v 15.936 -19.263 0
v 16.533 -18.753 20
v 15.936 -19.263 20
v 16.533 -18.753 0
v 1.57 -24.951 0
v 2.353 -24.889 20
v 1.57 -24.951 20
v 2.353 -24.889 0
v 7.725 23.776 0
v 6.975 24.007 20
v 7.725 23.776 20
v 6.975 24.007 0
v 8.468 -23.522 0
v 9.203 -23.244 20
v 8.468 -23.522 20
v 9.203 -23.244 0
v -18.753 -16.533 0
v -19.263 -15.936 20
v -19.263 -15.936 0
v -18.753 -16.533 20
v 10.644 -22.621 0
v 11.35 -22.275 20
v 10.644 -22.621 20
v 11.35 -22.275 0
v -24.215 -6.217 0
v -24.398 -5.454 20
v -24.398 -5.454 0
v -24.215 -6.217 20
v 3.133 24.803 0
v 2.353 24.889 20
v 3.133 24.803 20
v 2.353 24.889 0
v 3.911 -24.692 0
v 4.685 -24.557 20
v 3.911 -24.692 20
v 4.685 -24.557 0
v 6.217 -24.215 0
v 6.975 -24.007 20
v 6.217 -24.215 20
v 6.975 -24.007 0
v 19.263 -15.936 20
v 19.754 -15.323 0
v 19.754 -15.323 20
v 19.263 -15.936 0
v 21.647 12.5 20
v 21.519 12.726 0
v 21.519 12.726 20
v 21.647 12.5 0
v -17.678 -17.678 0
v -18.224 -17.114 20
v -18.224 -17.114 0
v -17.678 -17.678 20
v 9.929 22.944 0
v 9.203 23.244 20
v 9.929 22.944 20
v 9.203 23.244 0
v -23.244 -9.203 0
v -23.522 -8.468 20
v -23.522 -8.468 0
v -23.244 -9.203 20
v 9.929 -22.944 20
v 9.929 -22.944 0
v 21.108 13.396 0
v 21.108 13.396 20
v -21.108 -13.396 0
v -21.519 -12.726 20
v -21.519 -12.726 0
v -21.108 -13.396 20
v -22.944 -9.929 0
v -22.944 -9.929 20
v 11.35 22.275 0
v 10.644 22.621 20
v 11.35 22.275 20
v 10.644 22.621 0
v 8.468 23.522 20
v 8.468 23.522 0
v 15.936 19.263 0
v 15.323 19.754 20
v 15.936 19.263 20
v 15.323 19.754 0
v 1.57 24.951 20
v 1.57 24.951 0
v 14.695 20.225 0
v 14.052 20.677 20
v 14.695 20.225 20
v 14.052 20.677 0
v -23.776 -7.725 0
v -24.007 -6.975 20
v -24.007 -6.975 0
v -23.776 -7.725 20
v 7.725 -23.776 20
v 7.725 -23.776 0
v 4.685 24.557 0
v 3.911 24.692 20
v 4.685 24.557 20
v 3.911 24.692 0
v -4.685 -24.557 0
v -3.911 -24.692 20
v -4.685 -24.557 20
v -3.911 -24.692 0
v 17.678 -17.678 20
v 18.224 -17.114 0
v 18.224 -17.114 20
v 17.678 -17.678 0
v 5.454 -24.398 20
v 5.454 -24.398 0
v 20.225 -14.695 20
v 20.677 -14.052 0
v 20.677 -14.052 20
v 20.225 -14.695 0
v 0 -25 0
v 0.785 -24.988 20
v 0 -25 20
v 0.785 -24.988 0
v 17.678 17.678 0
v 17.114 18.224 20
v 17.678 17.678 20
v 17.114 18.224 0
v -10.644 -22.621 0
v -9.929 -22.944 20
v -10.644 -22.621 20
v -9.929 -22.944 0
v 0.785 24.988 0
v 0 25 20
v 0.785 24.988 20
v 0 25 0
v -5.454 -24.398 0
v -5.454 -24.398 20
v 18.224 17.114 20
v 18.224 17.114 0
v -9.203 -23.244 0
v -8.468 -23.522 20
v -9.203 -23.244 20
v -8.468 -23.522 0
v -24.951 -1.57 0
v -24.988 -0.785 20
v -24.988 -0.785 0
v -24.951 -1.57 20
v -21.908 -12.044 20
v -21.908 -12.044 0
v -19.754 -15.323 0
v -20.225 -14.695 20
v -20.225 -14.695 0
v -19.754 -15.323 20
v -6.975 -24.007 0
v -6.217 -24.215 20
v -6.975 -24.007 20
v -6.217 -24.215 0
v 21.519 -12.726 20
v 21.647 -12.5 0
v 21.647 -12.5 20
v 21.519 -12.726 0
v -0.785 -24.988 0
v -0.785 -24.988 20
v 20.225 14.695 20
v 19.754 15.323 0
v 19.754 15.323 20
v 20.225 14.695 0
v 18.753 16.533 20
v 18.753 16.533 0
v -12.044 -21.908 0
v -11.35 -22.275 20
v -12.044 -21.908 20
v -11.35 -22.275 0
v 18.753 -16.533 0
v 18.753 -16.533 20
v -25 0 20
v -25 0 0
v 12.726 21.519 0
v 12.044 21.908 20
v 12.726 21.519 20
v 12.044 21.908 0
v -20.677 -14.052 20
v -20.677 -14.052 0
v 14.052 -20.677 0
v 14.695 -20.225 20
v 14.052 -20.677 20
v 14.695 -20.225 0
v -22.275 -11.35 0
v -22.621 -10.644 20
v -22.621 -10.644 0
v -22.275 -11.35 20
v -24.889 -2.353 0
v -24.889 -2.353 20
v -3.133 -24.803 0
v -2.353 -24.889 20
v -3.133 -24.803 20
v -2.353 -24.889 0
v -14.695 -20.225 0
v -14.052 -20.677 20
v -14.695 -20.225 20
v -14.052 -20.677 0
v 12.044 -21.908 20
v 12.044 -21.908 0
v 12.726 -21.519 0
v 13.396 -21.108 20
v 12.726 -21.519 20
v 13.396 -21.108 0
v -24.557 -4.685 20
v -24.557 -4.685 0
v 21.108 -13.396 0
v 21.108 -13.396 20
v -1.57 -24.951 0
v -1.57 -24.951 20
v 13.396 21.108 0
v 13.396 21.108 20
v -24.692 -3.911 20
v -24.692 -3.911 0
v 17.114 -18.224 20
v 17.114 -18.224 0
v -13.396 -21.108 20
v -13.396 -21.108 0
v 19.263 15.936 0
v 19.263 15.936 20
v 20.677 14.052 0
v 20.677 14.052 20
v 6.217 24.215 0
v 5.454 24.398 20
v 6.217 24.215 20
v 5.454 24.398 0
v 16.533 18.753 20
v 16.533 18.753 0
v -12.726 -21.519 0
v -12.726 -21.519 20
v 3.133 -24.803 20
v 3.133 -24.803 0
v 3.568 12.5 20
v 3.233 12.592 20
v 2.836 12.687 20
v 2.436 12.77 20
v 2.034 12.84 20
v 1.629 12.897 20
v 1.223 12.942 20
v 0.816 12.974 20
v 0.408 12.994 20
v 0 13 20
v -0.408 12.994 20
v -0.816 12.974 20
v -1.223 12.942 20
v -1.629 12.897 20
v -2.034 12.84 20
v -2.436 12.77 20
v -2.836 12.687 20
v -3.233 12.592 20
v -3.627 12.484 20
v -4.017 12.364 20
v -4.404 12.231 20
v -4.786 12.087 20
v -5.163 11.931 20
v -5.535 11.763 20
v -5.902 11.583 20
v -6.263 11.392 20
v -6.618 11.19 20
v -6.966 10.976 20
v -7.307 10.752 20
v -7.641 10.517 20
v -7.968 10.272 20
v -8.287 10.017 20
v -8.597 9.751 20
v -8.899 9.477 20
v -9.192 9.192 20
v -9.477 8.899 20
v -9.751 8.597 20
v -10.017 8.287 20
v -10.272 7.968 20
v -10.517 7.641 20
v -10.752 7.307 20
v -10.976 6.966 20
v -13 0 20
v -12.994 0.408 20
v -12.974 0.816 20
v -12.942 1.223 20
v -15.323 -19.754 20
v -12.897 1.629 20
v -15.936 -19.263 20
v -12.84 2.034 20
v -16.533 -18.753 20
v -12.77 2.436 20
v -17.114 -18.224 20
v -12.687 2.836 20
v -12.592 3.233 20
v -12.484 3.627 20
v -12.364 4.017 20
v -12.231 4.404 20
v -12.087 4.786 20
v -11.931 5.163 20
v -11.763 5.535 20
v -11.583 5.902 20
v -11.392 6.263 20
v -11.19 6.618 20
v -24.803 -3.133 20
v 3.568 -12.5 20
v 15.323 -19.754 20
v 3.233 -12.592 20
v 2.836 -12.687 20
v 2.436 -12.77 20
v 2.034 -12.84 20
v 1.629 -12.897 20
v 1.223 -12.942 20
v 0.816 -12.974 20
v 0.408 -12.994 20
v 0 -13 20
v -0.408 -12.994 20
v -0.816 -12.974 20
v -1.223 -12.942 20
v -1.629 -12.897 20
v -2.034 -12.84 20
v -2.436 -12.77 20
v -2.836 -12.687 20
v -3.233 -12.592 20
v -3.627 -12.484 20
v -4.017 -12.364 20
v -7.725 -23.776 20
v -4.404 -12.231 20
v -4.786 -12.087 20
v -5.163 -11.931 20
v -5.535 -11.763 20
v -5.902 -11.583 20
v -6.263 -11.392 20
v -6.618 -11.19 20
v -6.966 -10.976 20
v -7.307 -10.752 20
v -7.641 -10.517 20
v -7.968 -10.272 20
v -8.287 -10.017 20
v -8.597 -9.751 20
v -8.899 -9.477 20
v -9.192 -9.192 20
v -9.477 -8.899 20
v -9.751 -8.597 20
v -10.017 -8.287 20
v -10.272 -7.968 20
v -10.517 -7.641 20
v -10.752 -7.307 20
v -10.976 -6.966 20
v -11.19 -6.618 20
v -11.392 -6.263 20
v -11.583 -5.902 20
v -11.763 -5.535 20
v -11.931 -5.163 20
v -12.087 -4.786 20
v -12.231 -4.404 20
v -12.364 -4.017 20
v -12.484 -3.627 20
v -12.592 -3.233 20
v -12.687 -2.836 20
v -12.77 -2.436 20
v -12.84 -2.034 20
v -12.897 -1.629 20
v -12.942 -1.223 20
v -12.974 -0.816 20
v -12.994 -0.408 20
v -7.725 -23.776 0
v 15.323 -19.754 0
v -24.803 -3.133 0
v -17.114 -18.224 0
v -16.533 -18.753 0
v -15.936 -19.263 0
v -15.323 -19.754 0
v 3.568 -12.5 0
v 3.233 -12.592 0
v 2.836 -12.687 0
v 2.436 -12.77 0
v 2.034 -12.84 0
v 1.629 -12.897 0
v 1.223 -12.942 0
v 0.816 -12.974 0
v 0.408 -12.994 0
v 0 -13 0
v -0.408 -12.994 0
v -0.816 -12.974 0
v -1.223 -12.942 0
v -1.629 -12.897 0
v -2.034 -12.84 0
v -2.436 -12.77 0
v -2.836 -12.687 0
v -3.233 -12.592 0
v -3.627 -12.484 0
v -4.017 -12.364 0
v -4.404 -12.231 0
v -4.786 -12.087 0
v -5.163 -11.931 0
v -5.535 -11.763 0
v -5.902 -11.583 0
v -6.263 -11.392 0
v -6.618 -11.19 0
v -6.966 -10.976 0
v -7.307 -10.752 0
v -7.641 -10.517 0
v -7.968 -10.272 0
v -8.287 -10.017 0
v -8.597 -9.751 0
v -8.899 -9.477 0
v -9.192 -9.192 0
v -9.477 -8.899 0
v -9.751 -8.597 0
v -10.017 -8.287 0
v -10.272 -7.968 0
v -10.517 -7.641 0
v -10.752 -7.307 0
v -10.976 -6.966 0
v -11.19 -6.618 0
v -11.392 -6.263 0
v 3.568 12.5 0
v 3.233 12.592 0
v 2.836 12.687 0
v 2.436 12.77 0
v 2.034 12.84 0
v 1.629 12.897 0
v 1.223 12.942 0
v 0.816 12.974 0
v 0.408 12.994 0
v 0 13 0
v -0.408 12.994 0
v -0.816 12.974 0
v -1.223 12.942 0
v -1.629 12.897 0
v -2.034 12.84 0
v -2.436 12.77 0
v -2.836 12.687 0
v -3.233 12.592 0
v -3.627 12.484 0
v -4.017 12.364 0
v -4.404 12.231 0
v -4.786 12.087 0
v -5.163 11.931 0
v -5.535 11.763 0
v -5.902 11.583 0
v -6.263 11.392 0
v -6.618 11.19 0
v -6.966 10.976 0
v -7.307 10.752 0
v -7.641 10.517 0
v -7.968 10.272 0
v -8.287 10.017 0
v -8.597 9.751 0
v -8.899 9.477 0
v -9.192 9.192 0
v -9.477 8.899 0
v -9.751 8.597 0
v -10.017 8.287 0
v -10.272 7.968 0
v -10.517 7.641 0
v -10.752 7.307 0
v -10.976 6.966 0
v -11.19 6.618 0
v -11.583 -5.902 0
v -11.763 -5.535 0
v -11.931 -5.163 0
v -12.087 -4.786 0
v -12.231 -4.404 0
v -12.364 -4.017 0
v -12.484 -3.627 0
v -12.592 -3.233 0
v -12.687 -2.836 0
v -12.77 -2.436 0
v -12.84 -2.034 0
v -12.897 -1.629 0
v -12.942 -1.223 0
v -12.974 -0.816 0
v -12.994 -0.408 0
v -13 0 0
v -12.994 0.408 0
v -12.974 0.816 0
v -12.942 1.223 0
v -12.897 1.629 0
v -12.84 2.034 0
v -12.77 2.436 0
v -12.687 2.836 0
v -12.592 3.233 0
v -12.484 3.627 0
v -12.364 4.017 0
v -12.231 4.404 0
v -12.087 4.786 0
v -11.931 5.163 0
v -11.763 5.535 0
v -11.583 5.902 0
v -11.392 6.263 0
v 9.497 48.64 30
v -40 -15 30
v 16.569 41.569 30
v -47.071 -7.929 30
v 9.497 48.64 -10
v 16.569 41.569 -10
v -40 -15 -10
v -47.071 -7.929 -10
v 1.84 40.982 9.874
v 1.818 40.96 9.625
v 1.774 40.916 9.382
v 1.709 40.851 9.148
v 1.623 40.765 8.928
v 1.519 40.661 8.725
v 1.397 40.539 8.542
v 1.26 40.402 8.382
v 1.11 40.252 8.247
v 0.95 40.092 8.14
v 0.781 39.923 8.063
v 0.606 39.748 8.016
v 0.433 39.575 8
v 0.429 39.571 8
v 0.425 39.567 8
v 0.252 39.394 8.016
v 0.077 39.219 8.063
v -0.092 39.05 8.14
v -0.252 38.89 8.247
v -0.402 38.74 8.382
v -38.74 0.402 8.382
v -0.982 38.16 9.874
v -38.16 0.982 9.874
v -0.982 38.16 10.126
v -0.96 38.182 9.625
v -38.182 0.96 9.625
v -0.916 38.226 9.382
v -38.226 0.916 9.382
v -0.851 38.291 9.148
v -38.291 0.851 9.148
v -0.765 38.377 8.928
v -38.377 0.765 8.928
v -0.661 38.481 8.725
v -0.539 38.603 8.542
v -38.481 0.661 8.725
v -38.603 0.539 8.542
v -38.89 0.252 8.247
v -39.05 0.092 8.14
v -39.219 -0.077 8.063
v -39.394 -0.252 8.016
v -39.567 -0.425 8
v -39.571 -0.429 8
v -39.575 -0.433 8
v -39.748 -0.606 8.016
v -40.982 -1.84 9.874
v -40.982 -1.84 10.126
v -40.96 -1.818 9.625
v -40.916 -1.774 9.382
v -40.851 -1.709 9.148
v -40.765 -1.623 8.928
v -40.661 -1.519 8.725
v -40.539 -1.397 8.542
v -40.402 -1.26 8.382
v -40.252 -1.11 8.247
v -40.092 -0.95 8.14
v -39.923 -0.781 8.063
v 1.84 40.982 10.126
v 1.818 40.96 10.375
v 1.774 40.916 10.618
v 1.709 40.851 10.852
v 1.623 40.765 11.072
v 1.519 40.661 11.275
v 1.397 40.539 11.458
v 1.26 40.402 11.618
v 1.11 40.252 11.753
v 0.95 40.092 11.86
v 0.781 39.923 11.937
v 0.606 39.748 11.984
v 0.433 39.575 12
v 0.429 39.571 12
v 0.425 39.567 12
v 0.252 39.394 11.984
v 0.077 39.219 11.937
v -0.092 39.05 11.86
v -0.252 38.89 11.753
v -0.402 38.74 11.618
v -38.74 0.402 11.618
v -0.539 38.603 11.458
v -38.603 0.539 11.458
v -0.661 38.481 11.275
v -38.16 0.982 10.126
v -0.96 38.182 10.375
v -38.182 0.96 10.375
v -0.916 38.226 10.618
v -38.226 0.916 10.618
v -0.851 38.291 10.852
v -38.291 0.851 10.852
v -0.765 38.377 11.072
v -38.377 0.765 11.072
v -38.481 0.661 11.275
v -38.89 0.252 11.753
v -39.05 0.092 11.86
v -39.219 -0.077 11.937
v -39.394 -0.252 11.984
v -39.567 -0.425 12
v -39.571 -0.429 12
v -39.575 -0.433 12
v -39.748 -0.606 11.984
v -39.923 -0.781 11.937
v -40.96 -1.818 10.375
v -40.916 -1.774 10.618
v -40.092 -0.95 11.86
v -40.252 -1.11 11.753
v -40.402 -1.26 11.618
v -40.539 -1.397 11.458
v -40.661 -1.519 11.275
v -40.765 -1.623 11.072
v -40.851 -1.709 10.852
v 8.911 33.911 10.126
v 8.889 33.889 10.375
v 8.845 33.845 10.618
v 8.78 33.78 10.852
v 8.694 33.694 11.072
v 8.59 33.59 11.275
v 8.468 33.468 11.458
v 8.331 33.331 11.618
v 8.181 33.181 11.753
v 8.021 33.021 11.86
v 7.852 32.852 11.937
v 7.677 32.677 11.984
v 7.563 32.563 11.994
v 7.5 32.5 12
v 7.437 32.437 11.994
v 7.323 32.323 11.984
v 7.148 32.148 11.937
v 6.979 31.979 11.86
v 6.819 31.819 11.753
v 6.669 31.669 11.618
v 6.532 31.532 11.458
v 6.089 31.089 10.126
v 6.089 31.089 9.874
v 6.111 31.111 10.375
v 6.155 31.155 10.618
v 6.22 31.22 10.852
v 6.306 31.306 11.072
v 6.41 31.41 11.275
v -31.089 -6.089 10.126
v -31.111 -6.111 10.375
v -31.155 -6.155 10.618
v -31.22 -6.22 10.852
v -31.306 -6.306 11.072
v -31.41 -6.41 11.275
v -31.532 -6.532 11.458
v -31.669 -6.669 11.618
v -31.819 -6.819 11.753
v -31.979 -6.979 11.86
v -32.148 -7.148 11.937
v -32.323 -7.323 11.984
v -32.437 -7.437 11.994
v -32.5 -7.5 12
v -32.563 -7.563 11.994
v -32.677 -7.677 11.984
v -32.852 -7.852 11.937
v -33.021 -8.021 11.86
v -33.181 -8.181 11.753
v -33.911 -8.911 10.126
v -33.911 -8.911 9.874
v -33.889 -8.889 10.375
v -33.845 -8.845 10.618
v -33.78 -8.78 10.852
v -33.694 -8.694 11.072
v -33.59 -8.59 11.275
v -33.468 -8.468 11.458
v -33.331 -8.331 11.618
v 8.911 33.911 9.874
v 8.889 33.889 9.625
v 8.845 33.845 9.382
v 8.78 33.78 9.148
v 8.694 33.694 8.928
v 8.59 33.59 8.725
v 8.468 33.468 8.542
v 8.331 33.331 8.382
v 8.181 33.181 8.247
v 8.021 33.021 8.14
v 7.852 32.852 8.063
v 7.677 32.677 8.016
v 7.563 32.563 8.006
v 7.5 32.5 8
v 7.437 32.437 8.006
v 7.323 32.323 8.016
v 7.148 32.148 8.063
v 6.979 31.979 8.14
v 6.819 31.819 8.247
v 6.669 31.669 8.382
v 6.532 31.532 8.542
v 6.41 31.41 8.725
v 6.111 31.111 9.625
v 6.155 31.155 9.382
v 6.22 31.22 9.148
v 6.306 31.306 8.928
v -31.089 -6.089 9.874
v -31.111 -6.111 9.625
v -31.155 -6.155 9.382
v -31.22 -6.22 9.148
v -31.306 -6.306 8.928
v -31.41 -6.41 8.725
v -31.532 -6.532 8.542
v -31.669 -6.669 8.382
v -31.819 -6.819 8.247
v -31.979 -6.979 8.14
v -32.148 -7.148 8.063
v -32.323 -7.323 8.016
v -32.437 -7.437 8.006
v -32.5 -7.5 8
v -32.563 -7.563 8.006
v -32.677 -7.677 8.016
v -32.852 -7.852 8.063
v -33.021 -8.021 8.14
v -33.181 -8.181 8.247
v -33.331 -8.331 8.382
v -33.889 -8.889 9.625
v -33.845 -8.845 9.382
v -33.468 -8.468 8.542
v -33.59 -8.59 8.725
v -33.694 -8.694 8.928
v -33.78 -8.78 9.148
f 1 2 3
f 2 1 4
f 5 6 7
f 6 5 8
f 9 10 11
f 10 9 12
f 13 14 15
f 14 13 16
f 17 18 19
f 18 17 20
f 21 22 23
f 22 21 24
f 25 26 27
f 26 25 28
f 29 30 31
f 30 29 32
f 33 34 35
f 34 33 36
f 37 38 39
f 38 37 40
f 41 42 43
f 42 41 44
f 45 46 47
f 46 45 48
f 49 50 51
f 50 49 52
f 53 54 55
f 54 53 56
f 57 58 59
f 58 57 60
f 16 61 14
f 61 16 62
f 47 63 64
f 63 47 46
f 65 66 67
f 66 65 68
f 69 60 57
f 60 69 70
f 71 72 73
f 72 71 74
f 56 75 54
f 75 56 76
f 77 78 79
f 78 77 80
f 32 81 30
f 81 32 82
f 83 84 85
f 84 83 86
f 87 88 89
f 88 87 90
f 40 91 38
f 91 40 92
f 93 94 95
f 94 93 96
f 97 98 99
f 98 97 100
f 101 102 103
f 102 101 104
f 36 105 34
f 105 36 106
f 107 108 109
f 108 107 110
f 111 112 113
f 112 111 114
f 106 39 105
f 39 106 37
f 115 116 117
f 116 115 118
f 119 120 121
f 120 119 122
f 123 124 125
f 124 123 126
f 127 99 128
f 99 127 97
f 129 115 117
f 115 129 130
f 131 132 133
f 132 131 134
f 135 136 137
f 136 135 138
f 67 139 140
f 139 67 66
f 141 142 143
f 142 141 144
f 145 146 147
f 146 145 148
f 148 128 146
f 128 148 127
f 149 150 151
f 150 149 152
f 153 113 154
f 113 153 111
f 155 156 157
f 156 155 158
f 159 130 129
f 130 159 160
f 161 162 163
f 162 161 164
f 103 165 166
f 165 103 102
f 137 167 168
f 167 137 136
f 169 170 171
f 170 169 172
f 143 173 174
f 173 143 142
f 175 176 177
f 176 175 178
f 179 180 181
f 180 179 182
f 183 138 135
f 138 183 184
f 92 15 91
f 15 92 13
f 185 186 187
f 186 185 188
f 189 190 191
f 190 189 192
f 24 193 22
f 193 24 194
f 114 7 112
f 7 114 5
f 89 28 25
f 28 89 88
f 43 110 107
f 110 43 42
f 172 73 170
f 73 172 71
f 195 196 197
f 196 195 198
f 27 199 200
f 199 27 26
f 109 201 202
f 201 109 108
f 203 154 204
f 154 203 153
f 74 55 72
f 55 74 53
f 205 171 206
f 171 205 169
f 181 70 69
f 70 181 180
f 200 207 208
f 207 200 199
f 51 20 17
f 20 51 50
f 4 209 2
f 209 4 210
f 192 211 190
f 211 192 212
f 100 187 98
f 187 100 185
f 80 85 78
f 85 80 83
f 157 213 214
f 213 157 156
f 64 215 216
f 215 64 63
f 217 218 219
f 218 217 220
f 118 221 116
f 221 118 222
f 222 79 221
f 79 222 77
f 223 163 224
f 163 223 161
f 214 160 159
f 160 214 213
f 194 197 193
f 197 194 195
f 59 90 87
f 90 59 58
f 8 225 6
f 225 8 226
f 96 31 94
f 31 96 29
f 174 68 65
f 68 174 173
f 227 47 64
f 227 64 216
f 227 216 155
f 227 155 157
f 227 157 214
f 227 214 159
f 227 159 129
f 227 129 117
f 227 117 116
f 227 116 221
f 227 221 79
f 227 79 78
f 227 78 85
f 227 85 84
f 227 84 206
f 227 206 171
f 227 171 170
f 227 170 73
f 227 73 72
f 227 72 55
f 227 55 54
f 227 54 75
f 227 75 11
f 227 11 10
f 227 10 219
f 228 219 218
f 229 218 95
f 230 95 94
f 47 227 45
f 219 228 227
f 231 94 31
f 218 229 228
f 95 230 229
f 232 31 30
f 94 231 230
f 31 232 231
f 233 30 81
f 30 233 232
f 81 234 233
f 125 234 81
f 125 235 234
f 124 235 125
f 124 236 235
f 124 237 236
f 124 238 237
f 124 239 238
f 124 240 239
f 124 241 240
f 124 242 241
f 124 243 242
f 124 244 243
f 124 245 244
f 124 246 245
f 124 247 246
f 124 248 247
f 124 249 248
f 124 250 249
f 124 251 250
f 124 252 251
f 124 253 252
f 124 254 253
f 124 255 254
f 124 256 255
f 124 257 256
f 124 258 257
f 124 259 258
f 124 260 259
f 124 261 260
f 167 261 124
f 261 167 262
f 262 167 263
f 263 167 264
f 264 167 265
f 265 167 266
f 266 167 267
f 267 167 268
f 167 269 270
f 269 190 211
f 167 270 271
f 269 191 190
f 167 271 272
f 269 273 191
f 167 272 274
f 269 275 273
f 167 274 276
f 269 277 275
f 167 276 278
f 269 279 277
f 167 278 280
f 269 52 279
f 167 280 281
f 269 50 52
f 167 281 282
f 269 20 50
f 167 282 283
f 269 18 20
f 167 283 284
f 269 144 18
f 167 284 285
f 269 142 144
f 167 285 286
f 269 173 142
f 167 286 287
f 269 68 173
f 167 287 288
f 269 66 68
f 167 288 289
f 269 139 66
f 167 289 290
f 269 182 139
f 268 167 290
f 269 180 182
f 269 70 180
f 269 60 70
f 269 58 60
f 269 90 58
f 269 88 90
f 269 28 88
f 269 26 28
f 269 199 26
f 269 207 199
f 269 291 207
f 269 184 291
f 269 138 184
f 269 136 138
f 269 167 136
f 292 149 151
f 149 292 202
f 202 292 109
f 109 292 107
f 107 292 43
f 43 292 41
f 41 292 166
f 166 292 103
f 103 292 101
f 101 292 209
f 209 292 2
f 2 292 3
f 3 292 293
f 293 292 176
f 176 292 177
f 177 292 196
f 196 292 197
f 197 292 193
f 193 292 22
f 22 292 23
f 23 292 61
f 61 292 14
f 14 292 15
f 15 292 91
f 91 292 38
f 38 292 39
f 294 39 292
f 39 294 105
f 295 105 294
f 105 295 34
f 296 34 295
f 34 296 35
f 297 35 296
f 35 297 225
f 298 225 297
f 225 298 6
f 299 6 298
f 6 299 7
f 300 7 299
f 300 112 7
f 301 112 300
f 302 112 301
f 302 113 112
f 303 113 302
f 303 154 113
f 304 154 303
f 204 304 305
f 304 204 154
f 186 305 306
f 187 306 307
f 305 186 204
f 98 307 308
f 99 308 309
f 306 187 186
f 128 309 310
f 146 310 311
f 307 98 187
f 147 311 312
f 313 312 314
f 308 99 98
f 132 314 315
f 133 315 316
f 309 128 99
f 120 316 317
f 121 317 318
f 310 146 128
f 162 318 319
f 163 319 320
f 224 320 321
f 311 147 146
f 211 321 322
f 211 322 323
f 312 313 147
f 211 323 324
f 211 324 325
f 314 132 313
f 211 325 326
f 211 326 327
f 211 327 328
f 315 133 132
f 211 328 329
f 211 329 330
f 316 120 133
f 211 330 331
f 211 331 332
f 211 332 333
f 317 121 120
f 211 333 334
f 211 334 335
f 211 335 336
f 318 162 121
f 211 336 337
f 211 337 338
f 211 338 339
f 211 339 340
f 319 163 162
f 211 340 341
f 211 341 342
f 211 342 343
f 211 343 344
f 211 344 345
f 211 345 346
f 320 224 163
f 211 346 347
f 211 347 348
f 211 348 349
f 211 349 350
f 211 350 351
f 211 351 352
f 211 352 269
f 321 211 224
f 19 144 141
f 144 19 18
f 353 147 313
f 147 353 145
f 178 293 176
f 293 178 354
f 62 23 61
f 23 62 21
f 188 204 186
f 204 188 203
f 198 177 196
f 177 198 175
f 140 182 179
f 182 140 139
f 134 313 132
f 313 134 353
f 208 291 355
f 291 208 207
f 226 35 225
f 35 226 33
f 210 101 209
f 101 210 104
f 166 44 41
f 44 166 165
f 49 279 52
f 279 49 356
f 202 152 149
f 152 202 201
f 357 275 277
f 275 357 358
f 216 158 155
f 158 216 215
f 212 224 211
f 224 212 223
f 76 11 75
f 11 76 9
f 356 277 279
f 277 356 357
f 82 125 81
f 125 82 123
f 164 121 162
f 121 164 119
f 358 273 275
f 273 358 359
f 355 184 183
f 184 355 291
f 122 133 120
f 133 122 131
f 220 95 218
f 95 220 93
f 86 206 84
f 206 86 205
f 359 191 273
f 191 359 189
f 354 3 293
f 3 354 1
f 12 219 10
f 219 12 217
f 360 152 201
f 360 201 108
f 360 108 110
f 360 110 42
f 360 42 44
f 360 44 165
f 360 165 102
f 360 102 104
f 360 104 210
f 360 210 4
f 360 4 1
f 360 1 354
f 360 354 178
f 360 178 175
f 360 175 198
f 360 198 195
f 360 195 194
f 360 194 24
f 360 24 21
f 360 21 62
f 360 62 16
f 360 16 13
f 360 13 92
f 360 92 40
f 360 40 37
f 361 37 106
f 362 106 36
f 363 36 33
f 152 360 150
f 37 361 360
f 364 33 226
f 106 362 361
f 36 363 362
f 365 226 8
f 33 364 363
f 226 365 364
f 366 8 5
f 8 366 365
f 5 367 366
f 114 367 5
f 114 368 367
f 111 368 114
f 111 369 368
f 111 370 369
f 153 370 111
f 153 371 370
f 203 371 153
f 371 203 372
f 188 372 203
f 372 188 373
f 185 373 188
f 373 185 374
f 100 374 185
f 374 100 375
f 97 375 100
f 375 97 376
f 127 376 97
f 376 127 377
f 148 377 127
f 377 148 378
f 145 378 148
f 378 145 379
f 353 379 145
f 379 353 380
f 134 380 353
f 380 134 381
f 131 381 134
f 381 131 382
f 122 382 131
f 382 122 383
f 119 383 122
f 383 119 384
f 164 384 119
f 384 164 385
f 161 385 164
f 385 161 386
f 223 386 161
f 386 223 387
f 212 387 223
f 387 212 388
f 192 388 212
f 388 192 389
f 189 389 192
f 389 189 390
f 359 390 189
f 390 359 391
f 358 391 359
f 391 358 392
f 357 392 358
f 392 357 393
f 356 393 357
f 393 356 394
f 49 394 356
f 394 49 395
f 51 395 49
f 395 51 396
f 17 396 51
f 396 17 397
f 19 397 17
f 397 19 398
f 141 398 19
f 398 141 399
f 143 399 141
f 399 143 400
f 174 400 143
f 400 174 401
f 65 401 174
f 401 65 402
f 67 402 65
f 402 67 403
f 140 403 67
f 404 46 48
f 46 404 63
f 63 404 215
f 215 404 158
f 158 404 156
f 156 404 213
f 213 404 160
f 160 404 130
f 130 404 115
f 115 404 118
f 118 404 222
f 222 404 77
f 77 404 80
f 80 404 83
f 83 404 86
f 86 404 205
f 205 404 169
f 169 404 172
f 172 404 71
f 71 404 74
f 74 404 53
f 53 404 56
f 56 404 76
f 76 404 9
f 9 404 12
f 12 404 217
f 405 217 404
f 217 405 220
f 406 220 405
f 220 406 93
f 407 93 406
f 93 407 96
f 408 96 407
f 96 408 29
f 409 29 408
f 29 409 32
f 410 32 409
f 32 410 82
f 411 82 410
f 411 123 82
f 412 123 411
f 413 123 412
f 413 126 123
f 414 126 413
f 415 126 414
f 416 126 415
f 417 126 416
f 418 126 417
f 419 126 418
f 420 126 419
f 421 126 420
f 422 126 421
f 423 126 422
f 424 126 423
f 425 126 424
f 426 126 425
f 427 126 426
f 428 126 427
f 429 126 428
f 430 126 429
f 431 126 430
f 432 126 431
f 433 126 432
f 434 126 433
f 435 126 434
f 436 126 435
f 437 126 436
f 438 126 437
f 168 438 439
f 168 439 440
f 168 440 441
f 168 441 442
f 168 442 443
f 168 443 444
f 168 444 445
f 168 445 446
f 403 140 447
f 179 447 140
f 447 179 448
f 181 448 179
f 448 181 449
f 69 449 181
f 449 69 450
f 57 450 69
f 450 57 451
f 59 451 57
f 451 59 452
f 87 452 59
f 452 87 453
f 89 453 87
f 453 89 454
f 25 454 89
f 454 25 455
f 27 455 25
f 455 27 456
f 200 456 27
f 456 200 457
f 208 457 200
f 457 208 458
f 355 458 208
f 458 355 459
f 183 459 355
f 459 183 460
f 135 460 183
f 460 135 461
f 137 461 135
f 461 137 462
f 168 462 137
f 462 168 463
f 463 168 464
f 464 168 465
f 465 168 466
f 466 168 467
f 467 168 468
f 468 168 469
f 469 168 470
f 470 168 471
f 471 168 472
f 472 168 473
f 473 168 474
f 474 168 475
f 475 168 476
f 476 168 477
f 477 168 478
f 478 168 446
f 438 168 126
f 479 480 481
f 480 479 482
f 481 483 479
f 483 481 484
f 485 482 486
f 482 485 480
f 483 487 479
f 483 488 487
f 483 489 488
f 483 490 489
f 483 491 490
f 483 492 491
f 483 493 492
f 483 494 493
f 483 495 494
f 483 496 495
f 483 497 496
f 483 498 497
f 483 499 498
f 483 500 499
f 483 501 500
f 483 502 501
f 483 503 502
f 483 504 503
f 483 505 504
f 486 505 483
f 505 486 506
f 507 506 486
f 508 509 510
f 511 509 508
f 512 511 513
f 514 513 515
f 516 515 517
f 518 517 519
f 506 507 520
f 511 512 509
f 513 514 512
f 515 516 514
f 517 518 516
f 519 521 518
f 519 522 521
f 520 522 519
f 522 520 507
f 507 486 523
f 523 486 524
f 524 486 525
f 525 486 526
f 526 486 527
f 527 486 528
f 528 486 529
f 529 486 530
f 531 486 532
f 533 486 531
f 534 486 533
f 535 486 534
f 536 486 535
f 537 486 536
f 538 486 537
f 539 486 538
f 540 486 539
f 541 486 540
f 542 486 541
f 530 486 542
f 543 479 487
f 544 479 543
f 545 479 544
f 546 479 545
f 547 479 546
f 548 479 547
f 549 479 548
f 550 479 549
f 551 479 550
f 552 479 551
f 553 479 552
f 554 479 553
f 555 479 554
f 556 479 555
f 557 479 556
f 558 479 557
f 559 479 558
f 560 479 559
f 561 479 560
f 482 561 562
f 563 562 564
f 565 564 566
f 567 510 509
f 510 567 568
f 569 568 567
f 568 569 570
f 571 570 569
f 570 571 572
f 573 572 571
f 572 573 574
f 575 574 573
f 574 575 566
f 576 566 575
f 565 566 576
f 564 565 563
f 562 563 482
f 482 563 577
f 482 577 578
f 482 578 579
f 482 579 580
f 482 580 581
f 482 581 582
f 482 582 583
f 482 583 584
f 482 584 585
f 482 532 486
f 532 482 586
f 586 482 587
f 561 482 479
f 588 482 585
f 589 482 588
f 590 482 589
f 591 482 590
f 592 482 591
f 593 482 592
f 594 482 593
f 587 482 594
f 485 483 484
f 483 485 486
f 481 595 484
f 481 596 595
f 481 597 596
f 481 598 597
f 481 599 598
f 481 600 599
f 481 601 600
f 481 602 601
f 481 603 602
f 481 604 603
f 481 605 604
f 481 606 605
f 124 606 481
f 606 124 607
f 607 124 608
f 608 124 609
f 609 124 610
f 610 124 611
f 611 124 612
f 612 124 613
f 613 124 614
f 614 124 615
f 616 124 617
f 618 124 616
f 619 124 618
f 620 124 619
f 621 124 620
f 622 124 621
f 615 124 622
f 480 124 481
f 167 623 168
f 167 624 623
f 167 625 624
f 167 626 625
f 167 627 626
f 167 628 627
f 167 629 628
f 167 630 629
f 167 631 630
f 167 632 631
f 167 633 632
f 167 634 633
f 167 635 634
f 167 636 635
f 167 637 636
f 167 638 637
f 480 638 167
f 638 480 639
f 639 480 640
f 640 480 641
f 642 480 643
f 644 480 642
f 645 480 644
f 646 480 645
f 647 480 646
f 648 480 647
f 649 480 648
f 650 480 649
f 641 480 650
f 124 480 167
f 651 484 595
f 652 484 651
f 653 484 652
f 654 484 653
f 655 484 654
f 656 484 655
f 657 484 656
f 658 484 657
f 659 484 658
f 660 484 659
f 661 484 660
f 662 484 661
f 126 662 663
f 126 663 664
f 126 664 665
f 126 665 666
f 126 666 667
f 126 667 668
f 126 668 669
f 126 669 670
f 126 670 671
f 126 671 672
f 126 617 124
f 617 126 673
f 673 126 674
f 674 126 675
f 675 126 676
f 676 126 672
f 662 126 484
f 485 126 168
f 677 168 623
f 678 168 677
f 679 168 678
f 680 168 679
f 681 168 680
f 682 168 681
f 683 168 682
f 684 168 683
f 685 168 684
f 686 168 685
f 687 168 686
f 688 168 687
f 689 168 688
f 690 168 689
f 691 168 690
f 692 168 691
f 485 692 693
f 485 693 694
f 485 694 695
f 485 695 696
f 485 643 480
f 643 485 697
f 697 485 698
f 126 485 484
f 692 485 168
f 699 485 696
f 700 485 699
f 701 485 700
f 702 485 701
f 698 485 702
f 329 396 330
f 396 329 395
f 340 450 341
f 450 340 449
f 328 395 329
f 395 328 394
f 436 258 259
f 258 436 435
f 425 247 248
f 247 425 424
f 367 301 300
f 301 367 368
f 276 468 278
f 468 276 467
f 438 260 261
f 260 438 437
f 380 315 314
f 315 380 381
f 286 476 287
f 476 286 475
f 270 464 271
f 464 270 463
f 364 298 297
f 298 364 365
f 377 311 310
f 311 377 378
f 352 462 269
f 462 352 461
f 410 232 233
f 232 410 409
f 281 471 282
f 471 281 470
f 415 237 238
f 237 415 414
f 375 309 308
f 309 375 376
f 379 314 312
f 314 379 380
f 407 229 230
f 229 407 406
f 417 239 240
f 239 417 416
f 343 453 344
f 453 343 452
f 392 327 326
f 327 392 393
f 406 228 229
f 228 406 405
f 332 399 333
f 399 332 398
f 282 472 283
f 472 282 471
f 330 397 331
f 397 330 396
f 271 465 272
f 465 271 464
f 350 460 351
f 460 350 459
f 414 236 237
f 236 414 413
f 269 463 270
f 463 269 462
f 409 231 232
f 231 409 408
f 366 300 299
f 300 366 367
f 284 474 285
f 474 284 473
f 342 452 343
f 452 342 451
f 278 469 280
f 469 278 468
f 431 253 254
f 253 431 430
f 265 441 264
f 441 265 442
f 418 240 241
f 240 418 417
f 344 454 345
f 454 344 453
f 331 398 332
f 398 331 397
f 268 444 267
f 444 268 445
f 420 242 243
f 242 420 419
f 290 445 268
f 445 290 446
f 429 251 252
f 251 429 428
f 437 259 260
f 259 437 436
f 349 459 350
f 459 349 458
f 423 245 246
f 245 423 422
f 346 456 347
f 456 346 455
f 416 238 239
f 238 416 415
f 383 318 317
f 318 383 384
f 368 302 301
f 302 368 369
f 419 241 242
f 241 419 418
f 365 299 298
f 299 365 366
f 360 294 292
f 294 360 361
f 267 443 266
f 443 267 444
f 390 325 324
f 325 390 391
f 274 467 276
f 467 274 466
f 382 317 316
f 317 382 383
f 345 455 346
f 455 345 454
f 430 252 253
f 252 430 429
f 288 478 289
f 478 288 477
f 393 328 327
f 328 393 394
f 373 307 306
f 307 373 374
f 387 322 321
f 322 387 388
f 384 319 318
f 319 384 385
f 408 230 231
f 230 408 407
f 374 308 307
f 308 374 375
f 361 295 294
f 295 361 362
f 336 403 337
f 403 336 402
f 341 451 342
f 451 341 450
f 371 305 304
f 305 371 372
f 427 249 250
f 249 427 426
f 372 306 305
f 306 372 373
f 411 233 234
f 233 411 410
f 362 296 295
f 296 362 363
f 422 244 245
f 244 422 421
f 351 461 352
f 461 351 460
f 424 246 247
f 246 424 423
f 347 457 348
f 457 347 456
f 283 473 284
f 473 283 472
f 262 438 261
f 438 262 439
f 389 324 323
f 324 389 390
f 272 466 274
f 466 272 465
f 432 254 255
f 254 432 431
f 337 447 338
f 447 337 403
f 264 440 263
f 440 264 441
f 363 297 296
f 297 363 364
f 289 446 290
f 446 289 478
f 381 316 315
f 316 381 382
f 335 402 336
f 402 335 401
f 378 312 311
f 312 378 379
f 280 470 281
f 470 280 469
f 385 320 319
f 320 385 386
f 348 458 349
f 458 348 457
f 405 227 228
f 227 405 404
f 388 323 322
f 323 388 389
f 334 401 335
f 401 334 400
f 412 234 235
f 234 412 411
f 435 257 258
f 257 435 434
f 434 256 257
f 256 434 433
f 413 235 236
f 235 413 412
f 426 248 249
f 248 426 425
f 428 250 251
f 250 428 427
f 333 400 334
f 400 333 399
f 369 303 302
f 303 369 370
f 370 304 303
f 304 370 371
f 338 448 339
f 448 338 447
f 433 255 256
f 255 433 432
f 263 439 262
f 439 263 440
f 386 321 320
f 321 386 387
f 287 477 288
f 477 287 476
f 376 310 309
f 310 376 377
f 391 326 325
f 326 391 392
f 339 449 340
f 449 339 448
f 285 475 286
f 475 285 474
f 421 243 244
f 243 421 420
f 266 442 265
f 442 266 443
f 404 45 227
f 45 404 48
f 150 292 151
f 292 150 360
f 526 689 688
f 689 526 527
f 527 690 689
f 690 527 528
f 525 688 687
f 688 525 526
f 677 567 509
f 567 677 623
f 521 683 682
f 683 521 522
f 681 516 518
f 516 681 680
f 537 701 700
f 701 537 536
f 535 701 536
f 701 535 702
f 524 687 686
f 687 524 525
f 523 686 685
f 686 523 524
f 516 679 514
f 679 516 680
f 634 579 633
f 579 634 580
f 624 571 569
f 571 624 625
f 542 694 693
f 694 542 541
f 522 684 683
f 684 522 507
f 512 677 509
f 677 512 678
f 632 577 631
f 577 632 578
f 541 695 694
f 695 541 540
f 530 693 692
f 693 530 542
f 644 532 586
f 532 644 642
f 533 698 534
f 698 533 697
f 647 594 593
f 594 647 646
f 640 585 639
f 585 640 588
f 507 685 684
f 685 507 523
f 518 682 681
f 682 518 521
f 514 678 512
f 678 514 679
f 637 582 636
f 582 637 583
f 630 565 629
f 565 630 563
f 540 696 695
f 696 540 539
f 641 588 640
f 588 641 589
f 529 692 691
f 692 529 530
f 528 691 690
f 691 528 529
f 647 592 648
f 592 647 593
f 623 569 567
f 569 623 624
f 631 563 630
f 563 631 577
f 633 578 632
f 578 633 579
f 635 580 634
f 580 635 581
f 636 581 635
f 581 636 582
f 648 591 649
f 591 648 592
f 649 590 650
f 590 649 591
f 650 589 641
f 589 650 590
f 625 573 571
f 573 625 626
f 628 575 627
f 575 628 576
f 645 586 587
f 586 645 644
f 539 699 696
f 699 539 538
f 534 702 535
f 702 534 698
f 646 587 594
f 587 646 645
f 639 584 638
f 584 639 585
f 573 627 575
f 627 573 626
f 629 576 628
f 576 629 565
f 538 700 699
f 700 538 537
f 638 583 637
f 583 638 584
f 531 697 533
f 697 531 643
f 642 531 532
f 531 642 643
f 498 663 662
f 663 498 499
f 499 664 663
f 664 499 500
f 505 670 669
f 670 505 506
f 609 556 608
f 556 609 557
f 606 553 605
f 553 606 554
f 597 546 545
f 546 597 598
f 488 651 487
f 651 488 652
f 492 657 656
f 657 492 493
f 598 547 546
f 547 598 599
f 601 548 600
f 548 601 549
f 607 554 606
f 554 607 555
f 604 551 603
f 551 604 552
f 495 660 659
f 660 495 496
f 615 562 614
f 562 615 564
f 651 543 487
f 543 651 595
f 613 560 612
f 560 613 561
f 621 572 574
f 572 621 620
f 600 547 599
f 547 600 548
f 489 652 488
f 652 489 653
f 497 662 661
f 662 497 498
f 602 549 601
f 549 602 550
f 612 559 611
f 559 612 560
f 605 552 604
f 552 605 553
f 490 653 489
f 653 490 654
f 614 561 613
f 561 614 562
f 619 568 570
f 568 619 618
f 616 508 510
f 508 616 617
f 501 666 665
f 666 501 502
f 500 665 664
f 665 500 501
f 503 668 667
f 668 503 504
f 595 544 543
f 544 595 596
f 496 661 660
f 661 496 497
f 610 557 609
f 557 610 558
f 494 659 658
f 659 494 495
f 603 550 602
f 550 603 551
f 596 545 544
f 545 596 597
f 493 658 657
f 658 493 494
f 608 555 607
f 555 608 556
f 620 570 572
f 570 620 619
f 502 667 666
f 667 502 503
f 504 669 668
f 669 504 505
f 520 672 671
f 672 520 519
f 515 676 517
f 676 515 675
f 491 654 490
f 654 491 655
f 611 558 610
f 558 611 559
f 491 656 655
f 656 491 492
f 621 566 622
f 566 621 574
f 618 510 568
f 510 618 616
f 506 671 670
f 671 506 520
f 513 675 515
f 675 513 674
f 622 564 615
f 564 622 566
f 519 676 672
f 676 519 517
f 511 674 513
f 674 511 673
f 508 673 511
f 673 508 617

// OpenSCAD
difference() {
  union() {
  cylinder(r=25,h=20,$fn=200);
  translate([-40,-15,-10]) rotate([0,0,45]) cube([80,10,40]);
  }
  translate([0,0,-1]) cylinder(r=13,h=30,$fn=200);
  translate([0,-12.5,-1]) cube([40,25,30]);
  
  translate([-40,00,10]) rotate([45,90,0]) cylinder(r=2,h=30,$fn=50);
  translate([0,40,10]) rotate([45,90,0]) cylinder(r=2,h=30,$fn=50);
}
